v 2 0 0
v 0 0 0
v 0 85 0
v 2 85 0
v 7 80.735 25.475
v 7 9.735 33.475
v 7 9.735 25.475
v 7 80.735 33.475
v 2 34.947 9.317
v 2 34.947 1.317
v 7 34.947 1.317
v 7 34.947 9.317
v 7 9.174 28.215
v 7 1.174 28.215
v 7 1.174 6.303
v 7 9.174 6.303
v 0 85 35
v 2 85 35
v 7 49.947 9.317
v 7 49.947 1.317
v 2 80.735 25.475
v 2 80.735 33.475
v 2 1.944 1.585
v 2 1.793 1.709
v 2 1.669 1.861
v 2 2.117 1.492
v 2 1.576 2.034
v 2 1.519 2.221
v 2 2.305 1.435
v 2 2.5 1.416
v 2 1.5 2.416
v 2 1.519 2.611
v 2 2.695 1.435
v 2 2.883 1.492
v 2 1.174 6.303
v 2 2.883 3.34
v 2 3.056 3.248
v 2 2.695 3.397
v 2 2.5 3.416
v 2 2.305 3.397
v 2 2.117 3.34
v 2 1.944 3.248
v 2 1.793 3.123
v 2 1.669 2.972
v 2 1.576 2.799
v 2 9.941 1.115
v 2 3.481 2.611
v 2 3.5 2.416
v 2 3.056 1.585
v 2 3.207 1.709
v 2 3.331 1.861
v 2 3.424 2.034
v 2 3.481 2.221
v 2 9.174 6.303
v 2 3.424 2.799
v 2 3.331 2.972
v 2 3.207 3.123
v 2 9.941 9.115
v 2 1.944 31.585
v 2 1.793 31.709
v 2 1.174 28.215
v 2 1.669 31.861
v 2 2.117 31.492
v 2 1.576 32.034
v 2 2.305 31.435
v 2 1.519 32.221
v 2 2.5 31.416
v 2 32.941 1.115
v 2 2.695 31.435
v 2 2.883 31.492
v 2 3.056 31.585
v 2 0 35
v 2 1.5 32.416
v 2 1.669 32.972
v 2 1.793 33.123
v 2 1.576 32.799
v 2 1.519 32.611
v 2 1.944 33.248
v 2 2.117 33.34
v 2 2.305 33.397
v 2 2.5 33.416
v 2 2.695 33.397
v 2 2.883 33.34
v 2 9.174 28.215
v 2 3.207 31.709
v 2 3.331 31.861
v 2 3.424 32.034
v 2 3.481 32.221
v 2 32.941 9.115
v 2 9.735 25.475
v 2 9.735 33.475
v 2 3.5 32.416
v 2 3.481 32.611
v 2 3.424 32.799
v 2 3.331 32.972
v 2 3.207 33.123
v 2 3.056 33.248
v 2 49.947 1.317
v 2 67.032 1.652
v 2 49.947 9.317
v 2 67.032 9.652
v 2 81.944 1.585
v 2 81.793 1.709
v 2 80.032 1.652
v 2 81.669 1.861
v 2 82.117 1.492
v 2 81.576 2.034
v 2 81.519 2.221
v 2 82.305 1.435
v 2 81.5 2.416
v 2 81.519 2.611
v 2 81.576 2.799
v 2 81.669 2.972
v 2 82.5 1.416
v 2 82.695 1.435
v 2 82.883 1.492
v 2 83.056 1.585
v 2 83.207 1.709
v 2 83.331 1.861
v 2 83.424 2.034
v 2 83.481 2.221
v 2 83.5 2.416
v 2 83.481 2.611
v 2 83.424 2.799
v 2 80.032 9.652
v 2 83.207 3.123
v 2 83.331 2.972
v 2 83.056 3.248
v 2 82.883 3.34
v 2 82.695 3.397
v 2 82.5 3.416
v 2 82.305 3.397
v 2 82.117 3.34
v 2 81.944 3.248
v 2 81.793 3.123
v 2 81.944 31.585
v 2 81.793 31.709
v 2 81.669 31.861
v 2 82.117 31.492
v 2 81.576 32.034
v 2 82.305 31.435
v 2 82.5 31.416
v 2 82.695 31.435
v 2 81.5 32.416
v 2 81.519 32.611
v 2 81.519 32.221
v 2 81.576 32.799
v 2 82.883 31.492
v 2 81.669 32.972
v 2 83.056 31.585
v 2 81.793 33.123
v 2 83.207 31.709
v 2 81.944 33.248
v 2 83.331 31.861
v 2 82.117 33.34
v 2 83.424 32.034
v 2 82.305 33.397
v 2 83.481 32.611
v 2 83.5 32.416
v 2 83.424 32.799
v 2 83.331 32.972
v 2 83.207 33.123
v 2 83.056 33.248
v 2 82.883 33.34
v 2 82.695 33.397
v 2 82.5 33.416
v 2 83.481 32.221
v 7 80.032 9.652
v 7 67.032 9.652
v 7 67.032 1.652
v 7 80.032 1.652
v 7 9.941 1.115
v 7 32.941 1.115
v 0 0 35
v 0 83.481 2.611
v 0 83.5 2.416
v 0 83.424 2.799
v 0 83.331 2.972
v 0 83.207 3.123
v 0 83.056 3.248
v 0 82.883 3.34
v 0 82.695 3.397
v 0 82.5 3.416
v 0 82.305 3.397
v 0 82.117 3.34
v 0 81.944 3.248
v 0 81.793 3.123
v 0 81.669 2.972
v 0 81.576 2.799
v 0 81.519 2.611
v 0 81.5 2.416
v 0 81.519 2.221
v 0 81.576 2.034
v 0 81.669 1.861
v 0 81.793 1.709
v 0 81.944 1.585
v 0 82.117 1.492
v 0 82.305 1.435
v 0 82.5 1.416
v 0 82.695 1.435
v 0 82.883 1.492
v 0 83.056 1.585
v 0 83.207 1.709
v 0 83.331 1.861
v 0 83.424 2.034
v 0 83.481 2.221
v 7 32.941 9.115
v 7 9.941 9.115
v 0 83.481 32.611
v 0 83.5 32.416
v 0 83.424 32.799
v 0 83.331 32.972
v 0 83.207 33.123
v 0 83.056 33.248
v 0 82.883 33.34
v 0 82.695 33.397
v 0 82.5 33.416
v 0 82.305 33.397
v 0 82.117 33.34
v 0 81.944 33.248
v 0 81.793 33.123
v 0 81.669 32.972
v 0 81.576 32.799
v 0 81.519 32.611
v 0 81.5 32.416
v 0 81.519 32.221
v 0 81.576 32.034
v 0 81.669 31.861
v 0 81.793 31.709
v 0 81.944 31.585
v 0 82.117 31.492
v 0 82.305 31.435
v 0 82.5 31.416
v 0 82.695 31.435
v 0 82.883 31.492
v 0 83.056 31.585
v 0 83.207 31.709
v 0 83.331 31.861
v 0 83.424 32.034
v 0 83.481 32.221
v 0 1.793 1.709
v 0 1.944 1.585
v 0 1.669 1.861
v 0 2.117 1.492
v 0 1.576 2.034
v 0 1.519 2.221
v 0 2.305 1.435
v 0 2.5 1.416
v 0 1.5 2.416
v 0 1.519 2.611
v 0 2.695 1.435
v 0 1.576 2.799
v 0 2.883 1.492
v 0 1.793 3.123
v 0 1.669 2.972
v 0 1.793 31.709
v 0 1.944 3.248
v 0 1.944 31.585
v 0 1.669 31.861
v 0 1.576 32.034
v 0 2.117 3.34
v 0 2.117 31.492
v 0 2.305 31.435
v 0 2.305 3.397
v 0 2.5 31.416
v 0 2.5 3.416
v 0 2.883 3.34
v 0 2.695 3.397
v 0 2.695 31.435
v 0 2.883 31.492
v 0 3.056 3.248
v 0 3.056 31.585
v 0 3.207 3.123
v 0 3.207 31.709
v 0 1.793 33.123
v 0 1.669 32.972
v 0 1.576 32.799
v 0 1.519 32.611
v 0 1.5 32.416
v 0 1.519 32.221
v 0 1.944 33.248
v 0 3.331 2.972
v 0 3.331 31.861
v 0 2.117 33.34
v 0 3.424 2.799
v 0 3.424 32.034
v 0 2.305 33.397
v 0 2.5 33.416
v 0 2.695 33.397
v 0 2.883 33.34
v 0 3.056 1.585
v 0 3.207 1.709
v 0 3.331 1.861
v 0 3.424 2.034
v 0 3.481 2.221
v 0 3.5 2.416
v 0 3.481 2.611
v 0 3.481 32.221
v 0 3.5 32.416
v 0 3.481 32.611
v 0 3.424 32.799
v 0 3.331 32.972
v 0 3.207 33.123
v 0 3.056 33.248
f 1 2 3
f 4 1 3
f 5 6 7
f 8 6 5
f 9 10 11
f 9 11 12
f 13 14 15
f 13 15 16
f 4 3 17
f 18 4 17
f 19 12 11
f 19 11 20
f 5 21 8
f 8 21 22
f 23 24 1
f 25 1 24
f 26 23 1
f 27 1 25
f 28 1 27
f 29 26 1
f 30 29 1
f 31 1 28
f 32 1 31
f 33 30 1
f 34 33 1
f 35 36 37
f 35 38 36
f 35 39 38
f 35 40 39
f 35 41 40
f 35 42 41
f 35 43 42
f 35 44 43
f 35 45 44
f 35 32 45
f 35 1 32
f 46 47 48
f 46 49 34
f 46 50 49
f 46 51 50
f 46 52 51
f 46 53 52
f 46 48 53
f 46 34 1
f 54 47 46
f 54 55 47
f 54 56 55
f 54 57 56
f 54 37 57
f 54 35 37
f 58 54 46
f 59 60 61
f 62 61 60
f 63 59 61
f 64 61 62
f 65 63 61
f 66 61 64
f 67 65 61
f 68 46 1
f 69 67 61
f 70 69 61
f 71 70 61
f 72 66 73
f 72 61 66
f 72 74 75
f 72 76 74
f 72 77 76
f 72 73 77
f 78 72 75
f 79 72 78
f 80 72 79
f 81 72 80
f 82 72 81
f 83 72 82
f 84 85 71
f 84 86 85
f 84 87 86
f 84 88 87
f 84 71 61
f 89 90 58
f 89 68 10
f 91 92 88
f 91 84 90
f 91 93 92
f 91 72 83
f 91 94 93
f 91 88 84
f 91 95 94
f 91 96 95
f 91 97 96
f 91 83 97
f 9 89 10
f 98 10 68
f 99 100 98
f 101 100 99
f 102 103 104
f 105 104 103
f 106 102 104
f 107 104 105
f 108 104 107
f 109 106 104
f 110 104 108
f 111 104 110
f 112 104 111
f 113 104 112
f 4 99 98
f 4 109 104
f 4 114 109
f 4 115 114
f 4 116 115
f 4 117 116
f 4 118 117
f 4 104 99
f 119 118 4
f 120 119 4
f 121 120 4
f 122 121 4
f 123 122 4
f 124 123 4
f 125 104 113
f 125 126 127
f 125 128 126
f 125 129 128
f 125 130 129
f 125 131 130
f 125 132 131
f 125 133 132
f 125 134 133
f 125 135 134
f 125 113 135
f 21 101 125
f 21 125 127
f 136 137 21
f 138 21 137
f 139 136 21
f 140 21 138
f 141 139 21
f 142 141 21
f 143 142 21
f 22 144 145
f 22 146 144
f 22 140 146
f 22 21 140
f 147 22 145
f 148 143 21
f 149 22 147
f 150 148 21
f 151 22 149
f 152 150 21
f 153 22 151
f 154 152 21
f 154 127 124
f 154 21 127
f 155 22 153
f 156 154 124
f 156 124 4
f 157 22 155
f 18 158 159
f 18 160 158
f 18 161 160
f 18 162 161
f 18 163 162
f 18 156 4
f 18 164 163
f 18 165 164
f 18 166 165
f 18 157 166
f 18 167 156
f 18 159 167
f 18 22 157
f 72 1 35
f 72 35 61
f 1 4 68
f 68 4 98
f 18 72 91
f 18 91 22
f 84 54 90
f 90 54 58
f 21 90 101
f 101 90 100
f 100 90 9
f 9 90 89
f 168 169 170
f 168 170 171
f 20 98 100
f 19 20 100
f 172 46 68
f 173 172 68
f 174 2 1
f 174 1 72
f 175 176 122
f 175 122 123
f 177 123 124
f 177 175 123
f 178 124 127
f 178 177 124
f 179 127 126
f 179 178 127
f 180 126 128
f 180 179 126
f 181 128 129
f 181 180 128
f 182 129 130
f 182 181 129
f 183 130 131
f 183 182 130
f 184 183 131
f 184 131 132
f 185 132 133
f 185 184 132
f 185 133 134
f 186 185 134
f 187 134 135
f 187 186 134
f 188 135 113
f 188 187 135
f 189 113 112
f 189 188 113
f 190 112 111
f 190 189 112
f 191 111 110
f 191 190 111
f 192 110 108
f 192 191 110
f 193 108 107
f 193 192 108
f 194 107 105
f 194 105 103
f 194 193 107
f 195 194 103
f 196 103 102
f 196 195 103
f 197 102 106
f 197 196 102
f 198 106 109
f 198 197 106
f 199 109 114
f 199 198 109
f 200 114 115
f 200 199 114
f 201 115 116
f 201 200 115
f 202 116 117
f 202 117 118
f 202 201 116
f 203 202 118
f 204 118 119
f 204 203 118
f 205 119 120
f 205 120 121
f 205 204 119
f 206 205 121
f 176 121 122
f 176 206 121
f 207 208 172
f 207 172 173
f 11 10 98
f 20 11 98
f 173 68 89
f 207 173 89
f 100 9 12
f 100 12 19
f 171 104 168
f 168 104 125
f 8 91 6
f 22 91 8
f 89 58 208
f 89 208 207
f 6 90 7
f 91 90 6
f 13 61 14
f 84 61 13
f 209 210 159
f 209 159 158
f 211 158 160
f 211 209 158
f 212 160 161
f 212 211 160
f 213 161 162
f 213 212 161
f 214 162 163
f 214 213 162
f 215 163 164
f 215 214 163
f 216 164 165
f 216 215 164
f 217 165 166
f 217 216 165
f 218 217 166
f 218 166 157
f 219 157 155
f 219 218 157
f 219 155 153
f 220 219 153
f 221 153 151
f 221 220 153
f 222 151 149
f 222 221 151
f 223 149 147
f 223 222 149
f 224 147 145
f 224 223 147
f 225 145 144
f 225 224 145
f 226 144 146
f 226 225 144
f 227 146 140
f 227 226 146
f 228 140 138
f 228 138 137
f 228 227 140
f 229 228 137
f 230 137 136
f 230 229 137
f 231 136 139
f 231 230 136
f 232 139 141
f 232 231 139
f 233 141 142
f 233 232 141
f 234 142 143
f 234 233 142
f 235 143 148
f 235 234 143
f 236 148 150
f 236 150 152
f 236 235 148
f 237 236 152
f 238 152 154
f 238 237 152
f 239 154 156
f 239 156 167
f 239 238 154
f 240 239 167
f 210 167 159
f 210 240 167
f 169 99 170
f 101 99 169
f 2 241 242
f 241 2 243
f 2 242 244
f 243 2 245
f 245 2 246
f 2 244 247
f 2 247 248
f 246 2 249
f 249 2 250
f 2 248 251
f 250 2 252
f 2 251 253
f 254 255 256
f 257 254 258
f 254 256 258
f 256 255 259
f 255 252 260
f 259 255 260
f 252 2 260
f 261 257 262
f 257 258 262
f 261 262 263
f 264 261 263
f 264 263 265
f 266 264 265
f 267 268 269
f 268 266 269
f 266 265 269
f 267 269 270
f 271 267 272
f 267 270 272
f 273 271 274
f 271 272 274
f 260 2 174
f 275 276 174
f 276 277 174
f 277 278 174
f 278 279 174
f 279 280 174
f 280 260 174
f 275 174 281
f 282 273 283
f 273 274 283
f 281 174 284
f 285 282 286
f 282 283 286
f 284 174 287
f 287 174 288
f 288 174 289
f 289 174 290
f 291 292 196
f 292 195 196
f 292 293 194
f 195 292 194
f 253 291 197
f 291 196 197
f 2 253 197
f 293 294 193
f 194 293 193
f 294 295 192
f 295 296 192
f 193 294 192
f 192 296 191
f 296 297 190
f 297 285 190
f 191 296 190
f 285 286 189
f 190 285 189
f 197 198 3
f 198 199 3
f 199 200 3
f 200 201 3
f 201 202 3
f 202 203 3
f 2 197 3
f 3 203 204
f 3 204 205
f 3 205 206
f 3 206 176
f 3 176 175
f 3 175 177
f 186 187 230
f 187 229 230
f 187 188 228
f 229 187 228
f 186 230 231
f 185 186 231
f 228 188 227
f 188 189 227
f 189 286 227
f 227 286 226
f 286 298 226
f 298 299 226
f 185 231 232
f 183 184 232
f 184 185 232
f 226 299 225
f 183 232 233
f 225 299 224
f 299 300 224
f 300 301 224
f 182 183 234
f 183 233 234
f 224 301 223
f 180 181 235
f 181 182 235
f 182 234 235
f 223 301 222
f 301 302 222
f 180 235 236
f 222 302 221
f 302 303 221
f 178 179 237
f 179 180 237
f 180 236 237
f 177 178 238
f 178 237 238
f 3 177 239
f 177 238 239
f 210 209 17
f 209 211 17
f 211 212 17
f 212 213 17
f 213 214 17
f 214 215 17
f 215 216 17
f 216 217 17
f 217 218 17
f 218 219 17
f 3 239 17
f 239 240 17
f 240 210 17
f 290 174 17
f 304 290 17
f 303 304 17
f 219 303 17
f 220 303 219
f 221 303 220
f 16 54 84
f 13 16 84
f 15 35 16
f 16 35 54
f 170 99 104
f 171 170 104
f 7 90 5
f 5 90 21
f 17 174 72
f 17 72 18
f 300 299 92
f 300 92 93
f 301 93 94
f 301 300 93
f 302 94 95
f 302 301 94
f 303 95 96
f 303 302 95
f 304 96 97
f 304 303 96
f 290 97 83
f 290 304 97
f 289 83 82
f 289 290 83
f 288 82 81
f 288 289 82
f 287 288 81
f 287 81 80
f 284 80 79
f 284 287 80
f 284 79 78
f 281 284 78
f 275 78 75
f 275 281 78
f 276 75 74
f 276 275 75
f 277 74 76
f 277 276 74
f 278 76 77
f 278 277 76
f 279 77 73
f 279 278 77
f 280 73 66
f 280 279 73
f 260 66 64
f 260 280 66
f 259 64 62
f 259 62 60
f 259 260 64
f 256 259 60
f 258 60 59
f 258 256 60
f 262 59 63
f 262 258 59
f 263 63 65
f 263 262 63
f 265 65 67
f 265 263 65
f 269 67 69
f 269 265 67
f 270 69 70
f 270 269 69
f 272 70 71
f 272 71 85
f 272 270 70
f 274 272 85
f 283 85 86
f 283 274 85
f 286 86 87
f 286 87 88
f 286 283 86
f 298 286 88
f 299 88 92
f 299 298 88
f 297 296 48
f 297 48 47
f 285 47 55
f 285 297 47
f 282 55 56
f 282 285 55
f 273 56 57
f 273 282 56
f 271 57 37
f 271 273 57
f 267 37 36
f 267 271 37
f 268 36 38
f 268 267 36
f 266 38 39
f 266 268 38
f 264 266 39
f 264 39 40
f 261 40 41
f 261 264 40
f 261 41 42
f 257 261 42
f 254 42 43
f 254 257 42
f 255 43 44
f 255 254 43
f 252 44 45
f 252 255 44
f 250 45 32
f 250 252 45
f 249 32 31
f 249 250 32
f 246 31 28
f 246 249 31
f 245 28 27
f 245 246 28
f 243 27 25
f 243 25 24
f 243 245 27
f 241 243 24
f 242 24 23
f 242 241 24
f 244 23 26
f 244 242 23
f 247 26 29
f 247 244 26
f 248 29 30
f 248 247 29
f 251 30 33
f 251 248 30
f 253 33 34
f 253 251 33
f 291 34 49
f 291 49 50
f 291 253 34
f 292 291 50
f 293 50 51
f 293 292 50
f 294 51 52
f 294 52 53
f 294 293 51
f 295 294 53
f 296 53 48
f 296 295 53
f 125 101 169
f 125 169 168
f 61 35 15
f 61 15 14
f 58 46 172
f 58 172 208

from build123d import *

# Parameters (mm, degrees)
SKETCH_W      = 85
SKETCH_H      = 35
SKETCH_R      = 1
PAD_DEPTH     = 2
SKETCH001_W   = 13
SKETCH001_H   = 8
SKETCH001_W_2 = 8
SKETCH001_H_2 = 21.912057
SKETCH001_W_3 = 71
SKETCH001_W_4 = 15
SKETCH001_W_5 = 23
PAD001_DEPTH  = 5


with BuildPart() as part:
    # Sketch → Pad (new body)
    with BuildSketch(Plane.YZ):
        with Locations((42.5, 17.5)):
            Rectangle(SKETCH_W, SKETCH_H)
        with Locations((2.5, 32.416278)):
            Circle(SKETCH_R, mode=Mode.SUBTRACT)
        with Locations((82.5, 32.416278)):
            Circle(SKETCH_R, mode=Mode.SUBTRACT)
        with Locations((82.5, 2.416278)):
            Circle(SKETCH_R, mode=Mode.SUBTRACT)
        with Locations((2.5, 2.416278)):
            Circle(SKETCH_R, mode=Mode.SUBTRACT)
    extrude(amount=PAD_DEPTH)

    # Sketch001 (on Face10 of Pad) → Pad001 (join)
    with BuildSketch(Plane.YZ.offset(2)):
        with Locations((73.531729, 5.652397)):
            Rectangle(SKETCH001_W, SKETCH001_H)
        with Locations((5.173597, 17.259363)):
            Rectangle(SKETCH001_W_2, SKETCH001_H_2)
        with Locations((45.234558, 29.475365)):
            Rectangle(SKETCH001_W_3, SKETCH001_H)
        with Locations((42.446848, 5.317278)):
            Rectangle(SKETCH001_W_4, SKETCH001_H)
        with Locations((21.441039, 5.114811)):
            Rectangle(SKETCH001_W_5, SKETCH001_H)
    extrude(amount=PAD001_DEPTH)


solid = part.part
